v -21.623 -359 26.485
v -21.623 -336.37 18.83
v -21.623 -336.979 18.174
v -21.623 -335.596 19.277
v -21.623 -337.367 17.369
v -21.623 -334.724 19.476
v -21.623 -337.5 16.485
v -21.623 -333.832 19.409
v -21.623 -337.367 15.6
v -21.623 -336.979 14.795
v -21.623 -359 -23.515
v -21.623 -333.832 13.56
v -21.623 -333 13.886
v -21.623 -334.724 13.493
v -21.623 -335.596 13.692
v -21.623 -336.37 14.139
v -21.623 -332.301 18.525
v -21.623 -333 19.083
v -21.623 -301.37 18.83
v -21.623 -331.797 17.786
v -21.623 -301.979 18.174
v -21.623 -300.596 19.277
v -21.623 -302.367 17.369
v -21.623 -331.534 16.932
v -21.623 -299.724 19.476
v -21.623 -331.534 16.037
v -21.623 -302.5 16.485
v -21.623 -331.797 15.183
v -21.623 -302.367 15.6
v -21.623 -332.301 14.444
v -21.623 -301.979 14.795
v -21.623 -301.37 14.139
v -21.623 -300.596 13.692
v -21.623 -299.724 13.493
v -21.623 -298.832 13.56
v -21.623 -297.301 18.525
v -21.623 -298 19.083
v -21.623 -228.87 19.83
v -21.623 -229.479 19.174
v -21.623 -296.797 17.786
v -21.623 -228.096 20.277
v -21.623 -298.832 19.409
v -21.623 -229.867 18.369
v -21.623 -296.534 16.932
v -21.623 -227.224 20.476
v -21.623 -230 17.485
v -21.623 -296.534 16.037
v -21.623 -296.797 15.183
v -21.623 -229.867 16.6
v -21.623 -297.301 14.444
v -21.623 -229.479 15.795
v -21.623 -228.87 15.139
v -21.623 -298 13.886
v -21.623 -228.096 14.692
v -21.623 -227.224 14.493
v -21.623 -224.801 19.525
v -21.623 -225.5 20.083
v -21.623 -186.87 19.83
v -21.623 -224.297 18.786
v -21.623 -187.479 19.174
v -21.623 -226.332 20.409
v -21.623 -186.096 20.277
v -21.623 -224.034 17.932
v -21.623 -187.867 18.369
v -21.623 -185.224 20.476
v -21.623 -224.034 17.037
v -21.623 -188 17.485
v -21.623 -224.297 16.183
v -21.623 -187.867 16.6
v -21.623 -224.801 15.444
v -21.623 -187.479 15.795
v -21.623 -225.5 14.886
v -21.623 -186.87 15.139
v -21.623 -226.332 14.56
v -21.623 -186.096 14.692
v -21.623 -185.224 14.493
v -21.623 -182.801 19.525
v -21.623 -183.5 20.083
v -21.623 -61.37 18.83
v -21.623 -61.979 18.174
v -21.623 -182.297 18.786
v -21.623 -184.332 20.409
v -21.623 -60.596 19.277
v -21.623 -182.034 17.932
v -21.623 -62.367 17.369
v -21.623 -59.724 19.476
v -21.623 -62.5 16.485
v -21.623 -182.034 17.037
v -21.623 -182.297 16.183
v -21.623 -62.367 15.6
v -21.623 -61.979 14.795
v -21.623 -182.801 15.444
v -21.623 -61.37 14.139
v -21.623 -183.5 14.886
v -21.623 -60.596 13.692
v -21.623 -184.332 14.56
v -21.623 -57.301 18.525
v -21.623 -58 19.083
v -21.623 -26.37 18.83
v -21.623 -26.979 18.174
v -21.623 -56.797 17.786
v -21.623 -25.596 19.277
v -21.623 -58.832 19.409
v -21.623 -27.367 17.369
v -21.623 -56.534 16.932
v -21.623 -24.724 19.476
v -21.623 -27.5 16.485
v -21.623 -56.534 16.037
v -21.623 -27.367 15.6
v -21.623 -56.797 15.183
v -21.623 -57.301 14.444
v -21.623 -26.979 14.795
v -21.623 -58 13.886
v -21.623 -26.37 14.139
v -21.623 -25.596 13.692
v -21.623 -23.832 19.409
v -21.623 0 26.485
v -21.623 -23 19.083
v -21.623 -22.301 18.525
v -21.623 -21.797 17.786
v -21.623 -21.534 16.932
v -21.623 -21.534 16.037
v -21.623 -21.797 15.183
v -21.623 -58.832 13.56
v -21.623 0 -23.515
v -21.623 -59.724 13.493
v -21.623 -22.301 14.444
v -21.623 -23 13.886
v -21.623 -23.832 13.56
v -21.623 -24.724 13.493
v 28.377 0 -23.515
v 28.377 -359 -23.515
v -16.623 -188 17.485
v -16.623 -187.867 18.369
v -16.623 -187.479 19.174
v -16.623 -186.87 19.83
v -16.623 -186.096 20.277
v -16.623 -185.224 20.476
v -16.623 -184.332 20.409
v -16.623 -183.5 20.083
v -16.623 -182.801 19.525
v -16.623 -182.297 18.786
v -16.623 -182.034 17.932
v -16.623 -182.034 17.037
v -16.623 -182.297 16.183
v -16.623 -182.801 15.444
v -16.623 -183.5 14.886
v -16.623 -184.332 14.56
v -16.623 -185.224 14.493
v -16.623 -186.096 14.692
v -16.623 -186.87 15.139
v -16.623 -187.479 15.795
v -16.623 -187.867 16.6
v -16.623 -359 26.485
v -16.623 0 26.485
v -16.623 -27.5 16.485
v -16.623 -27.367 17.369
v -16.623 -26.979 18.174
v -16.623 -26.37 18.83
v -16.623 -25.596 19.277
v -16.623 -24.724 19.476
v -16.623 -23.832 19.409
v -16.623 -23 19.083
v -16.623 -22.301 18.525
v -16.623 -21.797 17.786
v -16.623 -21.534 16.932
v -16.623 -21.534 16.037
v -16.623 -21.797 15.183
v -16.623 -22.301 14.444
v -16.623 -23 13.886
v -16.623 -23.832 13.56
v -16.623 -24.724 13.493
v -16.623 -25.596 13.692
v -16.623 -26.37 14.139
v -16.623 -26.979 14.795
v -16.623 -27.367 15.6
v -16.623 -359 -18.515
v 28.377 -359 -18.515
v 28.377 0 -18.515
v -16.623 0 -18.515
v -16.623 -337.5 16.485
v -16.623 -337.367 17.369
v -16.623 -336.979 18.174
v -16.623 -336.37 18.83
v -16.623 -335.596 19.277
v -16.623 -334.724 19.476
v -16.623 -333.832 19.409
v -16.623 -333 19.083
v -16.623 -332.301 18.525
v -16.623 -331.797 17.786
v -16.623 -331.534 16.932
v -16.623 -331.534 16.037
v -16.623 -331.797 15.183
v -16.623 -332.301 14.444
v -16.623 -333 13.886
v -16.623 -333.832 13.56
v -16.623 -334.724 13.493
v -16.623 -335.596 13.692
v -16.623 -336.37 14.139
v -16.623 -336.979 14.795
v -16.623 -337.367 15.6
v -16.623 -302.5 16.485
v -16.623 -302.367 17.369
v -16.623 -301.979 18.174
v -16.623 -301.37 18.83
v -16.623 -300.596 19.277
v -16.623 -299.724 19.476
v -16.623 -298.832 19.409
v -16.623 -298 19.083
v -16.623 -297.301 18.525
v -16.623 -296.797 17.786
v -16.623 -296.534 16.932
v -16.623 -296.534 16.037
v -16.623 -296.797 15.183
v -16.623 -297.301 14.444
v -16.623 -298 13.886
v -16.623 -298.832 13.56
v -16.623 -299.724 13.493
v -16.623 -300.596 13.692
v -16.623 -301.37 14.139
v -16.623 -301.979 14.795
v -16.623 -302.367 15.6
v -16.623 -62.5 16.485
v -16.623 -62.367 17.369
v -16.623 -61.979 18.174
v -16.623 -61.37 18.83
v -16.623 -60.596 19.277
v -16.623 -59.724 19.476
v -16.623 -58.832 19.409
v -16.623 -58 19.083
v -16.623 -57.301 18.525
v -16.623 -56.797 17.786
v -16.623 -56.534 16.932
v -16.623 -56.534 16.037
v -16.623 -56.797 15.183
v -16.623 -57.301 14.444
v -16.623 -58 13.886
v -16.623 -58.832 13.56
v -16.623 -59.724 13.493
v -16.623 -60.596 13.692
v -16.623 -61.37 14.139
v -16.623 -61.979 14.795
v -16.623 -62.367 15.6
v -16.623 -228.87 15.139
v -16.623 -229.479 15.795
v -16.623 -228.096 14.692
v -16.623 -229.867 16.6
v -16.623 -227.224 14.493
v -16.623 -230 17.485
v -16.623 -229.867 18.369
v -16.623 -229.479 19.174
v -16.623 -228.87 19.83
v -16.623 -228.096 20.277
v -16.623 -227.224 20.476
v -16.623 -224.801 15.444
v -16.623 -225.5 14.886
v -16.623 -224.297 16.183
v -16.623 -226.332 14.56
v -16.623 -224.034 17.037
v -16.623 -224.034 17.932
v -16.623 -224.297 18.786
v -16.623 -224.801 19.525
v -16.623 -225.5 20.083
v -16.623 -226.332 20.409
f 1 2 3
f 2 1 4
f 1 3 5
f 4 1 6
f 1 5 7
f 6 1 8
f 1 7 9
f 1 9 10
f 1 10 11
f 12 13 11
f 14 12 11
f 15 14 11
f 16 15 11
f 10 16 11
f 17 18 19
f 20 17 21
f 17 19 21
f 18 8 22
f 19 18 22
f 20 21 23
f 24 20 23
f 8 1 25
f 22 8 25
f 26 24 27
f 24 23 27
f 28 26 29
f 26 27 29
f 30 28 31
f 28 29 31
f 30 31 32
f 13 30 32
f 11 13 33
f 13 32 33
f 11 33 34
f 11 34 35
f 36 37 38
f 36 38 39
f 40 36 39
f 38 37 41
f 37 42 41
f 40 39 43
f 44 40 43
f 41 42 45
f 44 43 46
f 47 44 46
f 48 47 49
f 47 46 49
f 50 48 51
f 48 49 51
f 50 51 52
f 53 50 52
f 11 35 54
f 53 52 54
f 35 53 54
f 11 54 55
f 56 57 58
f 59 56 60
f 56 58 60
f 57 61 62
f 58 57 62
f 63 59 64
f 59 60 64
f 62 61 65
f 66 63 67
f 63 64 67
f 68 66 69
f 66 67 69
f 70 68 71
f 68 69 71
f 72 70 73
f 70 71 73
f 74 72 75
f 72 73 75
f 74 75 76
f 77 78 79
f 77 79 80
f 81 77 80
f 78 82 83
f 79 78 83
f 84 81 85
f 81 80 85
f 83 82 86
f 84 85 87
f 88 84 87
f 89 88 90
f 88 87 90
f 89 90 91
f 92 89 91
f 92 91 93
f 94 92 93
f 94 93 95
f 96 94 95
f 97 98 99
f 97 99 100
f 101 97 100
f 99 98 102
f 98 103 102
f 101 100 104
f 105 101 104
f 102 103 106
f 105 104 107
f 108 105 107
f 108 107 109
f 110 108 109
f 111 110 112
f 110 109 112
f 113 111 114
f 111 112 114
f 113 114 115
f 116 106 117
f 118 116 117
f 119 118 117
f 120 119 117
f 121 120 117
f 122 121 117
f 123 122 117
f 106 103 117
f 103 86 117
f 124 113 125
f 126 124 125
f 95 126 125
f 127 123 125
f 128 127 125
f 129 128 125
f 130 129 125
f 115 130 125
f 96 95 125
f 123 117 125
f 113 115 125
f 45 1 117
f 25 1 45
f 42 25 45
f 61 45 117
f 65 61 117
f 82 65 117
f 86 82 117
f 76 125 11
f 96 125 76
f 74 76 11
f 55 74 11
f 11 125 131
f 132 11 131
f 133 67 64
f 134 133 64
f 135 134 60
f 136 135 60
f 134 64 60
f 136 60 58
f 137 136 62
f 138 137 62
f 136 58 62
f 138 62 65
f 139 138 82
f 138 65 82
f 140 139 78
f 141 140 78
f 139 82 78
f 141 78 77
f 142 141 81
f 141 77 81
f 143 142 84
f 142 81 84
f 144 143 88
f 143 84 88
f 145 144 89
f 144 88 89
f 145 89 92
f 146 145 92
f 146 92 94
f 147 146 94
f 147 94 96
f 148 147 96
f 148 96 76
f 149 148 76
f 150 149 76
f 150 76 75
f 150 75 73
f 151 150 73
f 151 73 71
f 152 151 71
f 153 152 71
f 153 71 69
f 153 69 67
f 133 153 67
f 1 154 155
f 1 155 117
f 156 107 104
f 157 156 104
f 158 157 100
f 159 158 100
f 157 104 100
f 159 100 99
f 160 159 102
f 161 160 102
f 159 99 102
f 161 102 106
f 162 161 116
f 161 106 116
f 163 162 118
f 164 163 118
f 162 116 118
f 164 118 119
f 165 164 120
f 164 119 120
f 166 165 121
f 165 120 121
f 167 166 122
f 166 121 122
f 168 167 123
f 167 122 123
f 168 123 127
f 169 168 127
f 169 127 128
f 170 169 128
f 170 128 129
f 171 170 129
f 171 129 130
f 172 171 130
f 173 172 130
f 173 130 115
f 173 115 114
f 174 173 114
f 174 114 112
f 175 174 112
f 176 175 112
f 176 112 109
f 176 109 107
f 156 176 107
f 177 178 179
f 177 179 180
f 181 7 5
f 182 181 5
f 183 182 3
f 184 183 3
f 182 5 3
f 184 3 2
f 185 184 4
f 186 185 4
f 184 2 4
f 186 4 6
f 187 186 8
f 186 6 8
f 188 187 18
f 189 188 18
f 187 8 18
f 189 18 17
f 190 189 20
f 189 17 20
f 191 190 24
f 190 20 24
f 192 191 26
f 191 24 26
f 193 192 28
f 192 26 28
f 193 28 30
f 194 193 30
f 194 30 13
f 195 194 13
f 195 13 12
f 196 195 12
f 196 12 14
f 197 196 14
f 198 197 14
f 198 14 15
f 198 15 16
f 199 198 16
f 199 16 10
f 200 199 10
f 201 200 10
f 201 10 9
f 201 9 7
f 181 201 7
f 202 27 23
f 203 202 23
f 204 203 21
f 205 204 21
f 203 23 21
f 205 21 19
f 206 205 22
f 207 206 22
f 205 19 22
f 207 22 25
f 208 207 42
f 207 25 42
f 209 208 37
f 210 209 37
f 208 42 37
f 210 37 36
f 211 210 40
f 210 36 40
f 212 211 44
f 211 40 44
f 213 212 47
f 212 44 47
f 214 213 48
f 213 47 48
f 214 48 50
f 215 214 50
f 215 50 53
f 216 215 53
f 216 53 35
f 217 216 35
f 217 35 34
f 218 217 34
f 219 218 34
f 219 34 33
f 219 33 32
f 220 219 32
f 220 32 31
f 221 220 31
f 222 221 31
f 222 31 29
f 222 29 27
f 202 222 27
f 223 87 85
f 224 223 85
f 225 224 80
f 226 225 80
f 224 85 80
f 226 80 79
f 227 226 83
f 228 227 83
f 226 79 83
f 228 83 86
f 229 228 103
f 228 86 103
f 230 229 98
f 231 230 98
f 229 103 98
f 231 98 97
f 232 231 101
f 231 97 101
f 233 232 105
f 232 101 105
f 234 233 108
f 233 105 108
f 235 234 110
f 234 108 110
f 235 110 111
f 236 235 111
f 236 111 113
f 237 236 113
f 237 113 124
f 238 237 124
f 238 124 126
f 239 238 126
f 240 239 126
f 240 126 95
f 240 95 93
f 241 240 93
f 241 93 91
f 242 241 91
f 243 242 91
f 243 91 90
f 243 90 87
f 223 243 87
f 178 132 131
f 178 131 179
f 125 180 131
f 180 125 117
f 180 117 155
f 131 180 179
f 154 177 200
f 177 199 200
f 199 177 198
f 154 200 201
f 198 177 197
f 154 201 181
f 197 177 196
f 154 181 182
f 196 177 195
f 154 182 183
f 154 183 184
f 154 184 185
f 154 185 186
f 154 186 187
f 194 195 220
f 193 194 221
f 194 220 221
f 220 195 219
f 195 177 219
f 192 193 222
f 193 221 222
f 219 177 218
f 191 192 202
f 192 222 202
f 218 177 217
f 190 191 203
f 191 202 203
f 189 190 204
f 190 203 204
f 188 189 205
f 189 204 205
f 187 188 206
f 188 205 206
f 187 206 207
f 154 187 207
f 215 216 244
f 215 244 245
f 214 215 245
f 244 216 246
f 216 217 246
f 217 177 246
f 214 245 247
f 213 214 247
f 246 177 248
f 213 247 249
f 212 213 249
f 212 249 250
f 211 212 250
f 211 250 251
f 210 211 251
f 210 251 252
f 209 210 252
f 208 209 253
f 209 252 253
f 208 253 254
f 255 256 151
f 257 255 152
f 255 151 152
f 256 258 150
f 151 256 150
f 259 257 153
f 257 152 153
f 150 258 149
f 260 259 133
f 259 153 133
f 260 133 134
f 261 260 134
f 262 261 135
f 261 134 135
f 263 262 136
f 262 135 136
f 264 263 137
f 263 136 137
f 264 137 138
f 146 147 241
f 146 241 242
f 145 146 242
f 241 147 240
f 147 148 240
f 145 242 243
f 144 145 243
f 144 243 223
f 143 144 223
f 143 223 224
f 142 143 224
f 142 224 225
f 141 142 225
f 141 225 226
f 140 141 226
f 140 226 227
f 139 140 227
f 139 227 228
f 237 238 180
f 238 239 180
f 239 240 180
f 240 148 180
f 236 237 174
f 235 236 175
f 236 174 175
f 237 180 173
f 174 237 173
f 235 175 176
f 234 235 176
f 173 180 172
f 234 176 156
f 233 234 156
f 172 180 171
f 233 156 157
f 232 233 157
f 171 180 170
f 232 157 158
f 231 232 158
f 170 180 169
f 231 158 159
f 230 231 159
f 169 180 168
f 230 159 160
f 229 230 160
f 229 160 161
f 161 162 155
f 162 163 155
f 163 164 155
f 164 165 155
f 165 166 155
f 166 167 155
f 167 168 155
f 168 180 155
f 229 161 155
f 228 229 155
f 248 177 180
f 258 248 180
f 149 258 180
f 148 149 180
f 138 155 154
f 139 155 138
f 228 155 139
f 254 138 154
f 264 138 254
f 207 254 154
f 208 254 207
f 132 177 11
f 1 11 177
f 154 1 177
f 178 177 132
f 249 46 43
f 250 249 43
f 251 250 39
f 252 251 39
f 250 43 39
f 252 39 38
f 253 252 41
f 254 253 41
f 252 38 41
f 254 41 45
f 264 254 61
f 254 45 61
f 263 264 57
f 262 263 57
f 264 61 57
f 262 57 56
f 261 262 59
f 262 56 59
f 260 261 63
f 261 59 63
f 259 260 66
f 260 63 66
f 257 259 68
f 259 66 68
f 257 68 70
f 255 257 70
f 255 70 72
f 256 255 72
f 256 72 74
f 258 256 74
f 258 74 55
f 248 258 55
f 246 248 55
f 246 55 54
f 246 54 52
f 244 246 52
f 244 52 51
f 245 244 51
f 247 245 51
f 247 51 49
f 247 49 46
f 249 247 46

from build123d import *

# Parameters (mm, degrees)
F1_DEPTH = 359
F3_D     = 6
F4_D     = 6
F5_D     = 6
F6_D     = 6
F7_D     = 6
F7_DEPTH = 50


with BuildPart() as f1:
    # F0 (on Front) → F1 (new body)
    with BuildSketch(Plane.XZ):
        Polygon((-16.622992, 26.484536), (-21.622992, 26.484536), (-21.622992, -23.515464), (28.377008, -23.515464), (28.377008, -18.515464), (-16.622992, -18.515464), align=None)
    extrude(amount=F1_DEPTH)

    # F3 (through all)
    with Locations(Plane.YZ):
        with Locations((-334.5, 16.484536)):
            Hole(F3_D / 2)

    # F4 (through all)
    with Locations(Plane.YZ):
        with Locations((-24.5, 16.484536)):
            Hole(F4_D / 2)

    # F5 (through all)
    with Locations(Plane.YZ):
        with Locations((-299.5, 16.484536)):
            Hole(F5_D / 2)

    # F6 (through all)
    with Locations(Plane.YZ):
        with Locations((-59.5, 16.484536)):
            Hole(F6_D / 2)

    # F7
    with Locations(Plane.YZ):
        with Locations((-227, 17.484536), (-185, 17.484536)):
            Hole(F7_D / 2, depth=F7_DEPTH)


solid = f1.part
